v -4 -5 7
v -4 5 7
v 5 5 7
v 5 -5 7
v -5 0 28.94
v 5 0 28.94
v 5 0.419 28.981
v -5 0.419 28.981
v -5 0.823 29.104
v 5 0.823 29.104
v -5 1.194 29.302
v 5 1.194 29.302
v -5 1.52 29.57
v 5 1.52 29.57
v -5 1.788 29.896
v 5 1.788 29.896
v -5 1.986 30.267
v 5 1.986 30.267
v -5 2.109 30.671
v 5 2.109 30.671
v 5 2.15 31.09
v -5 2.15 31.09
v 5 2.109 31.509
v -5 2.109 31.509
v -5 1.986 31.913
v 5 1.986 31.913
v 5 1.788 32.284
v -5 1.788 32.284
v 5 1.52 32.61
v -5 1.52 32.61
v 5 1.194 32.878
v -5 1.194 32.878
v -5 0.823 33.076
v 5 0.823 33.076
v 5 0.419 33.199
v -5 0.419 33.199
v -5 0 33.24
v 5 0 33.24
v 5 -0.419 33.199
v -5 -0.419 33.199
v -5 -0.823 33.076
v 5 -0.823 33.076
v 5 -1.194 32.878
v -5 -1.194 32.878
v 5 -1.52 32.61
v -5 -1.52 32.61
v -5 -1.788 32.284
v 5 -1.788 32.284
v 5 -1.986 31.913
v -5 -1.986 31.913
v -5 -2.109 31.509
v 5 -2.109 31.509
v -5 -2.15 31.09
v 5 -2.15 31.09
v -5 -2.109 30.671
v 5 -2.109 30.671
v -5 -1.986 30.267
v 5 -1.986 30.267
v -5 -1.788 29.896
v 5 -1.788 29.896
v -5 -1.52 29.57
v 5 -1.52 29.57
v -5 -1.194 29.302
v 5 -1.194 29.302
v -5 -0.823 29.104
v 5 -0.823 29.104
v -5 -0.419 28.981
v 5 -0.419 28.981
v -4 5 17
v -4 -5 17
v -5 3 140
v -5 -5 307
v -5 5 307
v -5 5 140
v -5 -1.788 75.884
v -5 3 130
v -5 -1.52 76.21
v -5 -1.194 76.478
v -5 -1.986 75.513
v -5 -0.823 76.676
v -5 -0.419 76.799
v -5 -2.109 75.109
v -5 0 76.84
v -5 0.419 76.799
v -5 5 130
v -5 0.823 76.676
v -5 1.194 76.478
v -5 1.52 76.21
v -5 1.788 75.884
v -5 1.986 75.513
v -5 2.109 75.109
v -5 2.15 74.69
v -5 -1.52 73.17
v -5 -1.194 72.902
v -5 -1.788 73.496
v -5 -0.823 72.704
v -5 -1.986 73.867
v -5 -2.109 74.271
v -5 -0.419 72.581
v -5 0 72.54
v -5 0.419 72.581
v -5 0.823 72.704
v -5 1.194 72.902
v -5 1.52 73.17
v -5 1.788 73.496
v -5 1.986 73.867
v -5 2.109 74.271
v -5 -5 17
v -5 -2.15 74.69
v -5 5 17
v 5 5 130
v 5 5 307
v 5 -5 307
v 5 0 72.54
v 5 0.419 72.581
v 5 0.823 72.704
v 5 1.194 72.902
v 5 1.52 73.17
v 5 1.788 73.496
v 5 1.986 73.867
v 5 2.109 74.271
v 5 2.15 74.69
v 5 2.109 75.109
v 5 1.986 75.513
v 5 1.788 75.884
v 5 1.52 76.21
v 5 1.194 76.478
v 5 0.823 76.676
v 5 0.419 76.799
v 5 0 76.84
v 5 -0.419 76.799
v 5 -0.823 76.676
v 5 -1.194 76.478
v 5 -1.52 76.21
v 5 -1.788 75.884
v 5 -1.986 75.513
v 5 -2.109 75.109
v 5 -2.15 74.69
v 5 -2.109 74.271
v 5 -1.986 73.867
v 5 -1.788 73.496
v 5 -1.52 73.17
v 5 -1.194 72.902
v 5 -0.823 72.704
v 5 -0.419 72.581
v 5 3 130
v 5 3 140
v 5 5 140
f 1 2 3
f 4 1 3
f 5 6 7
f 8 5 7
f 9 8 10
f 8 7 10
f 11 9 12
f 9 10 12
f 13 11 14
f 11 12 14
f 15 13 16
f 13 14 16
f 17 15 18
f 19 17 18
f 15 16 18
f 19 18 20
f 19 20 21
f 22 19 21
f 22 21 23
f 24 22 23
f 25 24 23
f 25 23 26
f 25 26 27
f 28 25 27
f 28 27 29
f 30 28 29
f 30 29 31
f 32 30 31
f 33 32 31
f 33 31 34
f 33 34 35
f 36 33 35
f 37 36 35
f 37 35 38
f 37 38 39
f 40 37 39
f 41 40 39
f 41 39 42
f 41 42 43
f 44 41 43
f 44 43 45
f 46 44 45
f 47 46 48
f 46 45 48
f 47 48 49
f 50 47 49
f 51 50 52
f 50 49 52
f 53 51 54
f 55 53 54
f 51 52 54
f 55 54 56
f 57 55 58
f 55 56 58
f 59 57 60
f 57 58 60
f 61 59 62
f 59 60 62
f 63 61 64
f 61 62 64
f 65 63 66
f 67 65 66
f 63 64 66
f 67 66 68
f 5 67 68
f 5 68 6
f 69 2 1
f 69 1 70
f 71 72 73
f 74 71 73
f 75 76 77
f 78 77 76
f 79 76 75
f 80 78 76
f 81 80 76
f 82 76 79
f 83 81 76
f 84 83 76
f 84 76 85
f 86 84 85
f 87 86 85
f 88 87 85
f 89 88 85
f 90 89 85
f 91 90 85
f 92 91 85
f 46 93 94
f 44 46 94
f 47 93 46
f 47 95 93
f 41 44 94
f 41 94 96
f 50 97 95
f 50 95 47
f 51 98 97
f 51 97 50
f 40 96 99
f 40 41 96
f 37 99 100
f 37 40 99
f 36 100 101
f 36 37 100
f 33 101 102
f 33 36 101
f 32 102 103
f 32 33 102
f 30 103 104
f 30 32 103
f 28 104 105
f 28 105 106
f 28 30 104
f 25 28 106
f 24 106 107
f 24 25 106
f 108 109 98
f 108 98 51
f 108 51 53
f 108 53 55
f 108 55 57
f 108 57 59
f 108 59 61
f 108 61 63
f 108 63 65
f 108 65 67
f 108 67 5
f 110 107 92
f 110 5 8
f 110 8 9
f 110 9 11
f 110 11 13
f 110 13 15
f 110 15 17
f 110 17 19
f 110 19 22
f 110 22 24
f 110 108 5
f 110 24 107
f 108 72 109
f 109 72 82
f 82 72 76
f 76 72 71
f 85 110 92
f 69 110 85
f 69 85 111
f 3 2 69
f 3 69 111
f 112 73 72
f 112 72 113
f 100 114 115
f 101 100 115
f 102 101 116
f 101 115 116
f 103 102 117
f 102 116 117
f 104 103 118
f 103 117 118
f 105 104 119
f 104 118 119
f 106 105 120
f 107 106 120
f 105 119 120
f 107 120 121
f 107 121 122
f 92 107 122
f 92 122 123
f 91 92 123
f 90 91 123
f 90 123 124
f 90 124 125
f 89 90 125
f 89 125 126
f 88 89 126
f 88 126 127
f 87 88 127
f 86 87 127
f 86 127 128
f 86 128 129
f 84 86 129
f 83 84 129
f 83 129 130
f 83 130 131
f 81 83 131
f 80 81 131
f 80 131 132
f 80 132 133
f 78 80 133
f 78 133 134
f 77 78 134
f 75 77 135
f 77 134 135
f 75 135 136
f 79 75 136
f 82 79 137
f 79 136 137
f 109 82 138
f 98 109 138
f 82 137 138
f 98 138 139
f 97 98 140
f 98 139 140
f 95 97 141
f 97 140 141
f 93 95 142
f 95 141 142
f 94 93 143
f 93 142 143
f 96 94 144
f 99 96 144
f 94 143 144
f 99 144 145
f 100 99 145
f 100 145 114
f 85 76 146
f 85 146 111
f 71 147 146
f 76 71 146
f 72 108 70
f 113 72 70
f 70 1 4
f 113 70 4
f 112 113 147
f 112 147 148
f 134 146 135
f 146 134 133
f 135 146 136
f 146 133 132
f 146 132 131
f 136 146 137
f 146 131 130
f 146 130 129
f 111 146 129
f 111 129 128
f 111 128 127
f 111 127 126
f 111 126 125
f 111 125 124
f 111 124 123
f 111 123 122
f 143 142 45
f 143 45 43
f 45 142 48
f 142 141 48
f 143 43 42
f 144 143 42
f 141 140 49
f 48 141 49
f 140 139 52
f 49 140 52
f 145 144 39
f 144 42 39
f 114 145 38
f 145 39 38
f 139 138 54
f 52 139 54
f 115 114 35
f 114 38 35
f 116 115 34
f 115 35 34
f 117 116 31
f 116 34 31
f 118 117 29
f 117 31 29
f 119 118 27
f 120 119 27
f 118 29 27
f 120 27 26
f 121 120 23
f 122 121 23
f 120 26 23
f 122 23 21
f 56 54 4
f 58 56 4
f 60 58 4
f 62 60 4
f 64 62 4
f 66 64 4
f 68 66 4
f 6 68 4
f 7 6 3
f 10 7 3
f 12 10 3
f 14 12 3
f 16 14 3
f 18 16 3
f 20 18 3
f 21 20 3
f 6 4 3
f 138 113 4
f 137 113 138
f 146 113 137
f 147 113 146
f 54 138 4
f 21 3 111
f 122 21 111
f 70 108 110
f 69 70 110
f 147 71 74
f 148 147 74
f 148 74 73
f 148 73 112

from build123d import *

# Parameters (mm, degrees)
BOSS_EXTRU_1_START      = 7
ESQUISSE1_W             = 10
ESQUISSE1_H             = 10
BOSS_EXTRU_1_DEPTH      = 300
ESQUISSE4_W             = 10
ESQUISSE4_H             = 2
ENL_V_MAT_EXTRU_3_DEPTH = 11
ESQUISSE6_W             = 10
ESQUISSE6_H             = 10
ENL_V_MAT_EXTRU_5_DEPTH = 1
D_GAGEMENT_M41_D        = 4.3


with BuildPart() as part:
    # Esquisse1 → Boss.-Extru.1 (new body)
    with BuildSketch(Plane.XY.offset(BOSS_EXTRU_1_START)):
        Rectangle(ESQUISSE1_W, ESQUISSE1_H)
    extrude(amount=BOSS_EXTRU_1_DEPTH)

    # Esquisse4 → Enlèv. mat.-Extru.3 (cut, through all)
    with BuildSketch(Plane(origin=(5, 0, 0), x_dir=(0, 0, -1), z_dir=(1, 0, 0))):
        with Locations((-135, 4)):
            Rectangle(ESQUISSE4_W, ESQUISSE4_H)
    extrude(amount=-ENL_V_MAT_EXTRU_3_DEPTH, mode=Mode.SUBTRACT)

    # Esquisse6 → Enlèv. mat.-Extru.5 (cut)
    with BuildSketch(Plane.ZY.offset(5)):
        with Locations((12, 0)):
            Rectangle(ESQUISSE6_W, ESQUISSE6_H)
    extrude(amount=-ENL_V_MAT_EXTRU_5_DEPTH, mode=Mode.SUBTRACT)

    # Dégagement M41 (through all)
    with Locations(Plane.ZY.offset(5)):
        with Locations((74.69, 0), (31.09, 0)):
            Hole(D_GAGEMENT_M41_D / 2)


solid = part.part
